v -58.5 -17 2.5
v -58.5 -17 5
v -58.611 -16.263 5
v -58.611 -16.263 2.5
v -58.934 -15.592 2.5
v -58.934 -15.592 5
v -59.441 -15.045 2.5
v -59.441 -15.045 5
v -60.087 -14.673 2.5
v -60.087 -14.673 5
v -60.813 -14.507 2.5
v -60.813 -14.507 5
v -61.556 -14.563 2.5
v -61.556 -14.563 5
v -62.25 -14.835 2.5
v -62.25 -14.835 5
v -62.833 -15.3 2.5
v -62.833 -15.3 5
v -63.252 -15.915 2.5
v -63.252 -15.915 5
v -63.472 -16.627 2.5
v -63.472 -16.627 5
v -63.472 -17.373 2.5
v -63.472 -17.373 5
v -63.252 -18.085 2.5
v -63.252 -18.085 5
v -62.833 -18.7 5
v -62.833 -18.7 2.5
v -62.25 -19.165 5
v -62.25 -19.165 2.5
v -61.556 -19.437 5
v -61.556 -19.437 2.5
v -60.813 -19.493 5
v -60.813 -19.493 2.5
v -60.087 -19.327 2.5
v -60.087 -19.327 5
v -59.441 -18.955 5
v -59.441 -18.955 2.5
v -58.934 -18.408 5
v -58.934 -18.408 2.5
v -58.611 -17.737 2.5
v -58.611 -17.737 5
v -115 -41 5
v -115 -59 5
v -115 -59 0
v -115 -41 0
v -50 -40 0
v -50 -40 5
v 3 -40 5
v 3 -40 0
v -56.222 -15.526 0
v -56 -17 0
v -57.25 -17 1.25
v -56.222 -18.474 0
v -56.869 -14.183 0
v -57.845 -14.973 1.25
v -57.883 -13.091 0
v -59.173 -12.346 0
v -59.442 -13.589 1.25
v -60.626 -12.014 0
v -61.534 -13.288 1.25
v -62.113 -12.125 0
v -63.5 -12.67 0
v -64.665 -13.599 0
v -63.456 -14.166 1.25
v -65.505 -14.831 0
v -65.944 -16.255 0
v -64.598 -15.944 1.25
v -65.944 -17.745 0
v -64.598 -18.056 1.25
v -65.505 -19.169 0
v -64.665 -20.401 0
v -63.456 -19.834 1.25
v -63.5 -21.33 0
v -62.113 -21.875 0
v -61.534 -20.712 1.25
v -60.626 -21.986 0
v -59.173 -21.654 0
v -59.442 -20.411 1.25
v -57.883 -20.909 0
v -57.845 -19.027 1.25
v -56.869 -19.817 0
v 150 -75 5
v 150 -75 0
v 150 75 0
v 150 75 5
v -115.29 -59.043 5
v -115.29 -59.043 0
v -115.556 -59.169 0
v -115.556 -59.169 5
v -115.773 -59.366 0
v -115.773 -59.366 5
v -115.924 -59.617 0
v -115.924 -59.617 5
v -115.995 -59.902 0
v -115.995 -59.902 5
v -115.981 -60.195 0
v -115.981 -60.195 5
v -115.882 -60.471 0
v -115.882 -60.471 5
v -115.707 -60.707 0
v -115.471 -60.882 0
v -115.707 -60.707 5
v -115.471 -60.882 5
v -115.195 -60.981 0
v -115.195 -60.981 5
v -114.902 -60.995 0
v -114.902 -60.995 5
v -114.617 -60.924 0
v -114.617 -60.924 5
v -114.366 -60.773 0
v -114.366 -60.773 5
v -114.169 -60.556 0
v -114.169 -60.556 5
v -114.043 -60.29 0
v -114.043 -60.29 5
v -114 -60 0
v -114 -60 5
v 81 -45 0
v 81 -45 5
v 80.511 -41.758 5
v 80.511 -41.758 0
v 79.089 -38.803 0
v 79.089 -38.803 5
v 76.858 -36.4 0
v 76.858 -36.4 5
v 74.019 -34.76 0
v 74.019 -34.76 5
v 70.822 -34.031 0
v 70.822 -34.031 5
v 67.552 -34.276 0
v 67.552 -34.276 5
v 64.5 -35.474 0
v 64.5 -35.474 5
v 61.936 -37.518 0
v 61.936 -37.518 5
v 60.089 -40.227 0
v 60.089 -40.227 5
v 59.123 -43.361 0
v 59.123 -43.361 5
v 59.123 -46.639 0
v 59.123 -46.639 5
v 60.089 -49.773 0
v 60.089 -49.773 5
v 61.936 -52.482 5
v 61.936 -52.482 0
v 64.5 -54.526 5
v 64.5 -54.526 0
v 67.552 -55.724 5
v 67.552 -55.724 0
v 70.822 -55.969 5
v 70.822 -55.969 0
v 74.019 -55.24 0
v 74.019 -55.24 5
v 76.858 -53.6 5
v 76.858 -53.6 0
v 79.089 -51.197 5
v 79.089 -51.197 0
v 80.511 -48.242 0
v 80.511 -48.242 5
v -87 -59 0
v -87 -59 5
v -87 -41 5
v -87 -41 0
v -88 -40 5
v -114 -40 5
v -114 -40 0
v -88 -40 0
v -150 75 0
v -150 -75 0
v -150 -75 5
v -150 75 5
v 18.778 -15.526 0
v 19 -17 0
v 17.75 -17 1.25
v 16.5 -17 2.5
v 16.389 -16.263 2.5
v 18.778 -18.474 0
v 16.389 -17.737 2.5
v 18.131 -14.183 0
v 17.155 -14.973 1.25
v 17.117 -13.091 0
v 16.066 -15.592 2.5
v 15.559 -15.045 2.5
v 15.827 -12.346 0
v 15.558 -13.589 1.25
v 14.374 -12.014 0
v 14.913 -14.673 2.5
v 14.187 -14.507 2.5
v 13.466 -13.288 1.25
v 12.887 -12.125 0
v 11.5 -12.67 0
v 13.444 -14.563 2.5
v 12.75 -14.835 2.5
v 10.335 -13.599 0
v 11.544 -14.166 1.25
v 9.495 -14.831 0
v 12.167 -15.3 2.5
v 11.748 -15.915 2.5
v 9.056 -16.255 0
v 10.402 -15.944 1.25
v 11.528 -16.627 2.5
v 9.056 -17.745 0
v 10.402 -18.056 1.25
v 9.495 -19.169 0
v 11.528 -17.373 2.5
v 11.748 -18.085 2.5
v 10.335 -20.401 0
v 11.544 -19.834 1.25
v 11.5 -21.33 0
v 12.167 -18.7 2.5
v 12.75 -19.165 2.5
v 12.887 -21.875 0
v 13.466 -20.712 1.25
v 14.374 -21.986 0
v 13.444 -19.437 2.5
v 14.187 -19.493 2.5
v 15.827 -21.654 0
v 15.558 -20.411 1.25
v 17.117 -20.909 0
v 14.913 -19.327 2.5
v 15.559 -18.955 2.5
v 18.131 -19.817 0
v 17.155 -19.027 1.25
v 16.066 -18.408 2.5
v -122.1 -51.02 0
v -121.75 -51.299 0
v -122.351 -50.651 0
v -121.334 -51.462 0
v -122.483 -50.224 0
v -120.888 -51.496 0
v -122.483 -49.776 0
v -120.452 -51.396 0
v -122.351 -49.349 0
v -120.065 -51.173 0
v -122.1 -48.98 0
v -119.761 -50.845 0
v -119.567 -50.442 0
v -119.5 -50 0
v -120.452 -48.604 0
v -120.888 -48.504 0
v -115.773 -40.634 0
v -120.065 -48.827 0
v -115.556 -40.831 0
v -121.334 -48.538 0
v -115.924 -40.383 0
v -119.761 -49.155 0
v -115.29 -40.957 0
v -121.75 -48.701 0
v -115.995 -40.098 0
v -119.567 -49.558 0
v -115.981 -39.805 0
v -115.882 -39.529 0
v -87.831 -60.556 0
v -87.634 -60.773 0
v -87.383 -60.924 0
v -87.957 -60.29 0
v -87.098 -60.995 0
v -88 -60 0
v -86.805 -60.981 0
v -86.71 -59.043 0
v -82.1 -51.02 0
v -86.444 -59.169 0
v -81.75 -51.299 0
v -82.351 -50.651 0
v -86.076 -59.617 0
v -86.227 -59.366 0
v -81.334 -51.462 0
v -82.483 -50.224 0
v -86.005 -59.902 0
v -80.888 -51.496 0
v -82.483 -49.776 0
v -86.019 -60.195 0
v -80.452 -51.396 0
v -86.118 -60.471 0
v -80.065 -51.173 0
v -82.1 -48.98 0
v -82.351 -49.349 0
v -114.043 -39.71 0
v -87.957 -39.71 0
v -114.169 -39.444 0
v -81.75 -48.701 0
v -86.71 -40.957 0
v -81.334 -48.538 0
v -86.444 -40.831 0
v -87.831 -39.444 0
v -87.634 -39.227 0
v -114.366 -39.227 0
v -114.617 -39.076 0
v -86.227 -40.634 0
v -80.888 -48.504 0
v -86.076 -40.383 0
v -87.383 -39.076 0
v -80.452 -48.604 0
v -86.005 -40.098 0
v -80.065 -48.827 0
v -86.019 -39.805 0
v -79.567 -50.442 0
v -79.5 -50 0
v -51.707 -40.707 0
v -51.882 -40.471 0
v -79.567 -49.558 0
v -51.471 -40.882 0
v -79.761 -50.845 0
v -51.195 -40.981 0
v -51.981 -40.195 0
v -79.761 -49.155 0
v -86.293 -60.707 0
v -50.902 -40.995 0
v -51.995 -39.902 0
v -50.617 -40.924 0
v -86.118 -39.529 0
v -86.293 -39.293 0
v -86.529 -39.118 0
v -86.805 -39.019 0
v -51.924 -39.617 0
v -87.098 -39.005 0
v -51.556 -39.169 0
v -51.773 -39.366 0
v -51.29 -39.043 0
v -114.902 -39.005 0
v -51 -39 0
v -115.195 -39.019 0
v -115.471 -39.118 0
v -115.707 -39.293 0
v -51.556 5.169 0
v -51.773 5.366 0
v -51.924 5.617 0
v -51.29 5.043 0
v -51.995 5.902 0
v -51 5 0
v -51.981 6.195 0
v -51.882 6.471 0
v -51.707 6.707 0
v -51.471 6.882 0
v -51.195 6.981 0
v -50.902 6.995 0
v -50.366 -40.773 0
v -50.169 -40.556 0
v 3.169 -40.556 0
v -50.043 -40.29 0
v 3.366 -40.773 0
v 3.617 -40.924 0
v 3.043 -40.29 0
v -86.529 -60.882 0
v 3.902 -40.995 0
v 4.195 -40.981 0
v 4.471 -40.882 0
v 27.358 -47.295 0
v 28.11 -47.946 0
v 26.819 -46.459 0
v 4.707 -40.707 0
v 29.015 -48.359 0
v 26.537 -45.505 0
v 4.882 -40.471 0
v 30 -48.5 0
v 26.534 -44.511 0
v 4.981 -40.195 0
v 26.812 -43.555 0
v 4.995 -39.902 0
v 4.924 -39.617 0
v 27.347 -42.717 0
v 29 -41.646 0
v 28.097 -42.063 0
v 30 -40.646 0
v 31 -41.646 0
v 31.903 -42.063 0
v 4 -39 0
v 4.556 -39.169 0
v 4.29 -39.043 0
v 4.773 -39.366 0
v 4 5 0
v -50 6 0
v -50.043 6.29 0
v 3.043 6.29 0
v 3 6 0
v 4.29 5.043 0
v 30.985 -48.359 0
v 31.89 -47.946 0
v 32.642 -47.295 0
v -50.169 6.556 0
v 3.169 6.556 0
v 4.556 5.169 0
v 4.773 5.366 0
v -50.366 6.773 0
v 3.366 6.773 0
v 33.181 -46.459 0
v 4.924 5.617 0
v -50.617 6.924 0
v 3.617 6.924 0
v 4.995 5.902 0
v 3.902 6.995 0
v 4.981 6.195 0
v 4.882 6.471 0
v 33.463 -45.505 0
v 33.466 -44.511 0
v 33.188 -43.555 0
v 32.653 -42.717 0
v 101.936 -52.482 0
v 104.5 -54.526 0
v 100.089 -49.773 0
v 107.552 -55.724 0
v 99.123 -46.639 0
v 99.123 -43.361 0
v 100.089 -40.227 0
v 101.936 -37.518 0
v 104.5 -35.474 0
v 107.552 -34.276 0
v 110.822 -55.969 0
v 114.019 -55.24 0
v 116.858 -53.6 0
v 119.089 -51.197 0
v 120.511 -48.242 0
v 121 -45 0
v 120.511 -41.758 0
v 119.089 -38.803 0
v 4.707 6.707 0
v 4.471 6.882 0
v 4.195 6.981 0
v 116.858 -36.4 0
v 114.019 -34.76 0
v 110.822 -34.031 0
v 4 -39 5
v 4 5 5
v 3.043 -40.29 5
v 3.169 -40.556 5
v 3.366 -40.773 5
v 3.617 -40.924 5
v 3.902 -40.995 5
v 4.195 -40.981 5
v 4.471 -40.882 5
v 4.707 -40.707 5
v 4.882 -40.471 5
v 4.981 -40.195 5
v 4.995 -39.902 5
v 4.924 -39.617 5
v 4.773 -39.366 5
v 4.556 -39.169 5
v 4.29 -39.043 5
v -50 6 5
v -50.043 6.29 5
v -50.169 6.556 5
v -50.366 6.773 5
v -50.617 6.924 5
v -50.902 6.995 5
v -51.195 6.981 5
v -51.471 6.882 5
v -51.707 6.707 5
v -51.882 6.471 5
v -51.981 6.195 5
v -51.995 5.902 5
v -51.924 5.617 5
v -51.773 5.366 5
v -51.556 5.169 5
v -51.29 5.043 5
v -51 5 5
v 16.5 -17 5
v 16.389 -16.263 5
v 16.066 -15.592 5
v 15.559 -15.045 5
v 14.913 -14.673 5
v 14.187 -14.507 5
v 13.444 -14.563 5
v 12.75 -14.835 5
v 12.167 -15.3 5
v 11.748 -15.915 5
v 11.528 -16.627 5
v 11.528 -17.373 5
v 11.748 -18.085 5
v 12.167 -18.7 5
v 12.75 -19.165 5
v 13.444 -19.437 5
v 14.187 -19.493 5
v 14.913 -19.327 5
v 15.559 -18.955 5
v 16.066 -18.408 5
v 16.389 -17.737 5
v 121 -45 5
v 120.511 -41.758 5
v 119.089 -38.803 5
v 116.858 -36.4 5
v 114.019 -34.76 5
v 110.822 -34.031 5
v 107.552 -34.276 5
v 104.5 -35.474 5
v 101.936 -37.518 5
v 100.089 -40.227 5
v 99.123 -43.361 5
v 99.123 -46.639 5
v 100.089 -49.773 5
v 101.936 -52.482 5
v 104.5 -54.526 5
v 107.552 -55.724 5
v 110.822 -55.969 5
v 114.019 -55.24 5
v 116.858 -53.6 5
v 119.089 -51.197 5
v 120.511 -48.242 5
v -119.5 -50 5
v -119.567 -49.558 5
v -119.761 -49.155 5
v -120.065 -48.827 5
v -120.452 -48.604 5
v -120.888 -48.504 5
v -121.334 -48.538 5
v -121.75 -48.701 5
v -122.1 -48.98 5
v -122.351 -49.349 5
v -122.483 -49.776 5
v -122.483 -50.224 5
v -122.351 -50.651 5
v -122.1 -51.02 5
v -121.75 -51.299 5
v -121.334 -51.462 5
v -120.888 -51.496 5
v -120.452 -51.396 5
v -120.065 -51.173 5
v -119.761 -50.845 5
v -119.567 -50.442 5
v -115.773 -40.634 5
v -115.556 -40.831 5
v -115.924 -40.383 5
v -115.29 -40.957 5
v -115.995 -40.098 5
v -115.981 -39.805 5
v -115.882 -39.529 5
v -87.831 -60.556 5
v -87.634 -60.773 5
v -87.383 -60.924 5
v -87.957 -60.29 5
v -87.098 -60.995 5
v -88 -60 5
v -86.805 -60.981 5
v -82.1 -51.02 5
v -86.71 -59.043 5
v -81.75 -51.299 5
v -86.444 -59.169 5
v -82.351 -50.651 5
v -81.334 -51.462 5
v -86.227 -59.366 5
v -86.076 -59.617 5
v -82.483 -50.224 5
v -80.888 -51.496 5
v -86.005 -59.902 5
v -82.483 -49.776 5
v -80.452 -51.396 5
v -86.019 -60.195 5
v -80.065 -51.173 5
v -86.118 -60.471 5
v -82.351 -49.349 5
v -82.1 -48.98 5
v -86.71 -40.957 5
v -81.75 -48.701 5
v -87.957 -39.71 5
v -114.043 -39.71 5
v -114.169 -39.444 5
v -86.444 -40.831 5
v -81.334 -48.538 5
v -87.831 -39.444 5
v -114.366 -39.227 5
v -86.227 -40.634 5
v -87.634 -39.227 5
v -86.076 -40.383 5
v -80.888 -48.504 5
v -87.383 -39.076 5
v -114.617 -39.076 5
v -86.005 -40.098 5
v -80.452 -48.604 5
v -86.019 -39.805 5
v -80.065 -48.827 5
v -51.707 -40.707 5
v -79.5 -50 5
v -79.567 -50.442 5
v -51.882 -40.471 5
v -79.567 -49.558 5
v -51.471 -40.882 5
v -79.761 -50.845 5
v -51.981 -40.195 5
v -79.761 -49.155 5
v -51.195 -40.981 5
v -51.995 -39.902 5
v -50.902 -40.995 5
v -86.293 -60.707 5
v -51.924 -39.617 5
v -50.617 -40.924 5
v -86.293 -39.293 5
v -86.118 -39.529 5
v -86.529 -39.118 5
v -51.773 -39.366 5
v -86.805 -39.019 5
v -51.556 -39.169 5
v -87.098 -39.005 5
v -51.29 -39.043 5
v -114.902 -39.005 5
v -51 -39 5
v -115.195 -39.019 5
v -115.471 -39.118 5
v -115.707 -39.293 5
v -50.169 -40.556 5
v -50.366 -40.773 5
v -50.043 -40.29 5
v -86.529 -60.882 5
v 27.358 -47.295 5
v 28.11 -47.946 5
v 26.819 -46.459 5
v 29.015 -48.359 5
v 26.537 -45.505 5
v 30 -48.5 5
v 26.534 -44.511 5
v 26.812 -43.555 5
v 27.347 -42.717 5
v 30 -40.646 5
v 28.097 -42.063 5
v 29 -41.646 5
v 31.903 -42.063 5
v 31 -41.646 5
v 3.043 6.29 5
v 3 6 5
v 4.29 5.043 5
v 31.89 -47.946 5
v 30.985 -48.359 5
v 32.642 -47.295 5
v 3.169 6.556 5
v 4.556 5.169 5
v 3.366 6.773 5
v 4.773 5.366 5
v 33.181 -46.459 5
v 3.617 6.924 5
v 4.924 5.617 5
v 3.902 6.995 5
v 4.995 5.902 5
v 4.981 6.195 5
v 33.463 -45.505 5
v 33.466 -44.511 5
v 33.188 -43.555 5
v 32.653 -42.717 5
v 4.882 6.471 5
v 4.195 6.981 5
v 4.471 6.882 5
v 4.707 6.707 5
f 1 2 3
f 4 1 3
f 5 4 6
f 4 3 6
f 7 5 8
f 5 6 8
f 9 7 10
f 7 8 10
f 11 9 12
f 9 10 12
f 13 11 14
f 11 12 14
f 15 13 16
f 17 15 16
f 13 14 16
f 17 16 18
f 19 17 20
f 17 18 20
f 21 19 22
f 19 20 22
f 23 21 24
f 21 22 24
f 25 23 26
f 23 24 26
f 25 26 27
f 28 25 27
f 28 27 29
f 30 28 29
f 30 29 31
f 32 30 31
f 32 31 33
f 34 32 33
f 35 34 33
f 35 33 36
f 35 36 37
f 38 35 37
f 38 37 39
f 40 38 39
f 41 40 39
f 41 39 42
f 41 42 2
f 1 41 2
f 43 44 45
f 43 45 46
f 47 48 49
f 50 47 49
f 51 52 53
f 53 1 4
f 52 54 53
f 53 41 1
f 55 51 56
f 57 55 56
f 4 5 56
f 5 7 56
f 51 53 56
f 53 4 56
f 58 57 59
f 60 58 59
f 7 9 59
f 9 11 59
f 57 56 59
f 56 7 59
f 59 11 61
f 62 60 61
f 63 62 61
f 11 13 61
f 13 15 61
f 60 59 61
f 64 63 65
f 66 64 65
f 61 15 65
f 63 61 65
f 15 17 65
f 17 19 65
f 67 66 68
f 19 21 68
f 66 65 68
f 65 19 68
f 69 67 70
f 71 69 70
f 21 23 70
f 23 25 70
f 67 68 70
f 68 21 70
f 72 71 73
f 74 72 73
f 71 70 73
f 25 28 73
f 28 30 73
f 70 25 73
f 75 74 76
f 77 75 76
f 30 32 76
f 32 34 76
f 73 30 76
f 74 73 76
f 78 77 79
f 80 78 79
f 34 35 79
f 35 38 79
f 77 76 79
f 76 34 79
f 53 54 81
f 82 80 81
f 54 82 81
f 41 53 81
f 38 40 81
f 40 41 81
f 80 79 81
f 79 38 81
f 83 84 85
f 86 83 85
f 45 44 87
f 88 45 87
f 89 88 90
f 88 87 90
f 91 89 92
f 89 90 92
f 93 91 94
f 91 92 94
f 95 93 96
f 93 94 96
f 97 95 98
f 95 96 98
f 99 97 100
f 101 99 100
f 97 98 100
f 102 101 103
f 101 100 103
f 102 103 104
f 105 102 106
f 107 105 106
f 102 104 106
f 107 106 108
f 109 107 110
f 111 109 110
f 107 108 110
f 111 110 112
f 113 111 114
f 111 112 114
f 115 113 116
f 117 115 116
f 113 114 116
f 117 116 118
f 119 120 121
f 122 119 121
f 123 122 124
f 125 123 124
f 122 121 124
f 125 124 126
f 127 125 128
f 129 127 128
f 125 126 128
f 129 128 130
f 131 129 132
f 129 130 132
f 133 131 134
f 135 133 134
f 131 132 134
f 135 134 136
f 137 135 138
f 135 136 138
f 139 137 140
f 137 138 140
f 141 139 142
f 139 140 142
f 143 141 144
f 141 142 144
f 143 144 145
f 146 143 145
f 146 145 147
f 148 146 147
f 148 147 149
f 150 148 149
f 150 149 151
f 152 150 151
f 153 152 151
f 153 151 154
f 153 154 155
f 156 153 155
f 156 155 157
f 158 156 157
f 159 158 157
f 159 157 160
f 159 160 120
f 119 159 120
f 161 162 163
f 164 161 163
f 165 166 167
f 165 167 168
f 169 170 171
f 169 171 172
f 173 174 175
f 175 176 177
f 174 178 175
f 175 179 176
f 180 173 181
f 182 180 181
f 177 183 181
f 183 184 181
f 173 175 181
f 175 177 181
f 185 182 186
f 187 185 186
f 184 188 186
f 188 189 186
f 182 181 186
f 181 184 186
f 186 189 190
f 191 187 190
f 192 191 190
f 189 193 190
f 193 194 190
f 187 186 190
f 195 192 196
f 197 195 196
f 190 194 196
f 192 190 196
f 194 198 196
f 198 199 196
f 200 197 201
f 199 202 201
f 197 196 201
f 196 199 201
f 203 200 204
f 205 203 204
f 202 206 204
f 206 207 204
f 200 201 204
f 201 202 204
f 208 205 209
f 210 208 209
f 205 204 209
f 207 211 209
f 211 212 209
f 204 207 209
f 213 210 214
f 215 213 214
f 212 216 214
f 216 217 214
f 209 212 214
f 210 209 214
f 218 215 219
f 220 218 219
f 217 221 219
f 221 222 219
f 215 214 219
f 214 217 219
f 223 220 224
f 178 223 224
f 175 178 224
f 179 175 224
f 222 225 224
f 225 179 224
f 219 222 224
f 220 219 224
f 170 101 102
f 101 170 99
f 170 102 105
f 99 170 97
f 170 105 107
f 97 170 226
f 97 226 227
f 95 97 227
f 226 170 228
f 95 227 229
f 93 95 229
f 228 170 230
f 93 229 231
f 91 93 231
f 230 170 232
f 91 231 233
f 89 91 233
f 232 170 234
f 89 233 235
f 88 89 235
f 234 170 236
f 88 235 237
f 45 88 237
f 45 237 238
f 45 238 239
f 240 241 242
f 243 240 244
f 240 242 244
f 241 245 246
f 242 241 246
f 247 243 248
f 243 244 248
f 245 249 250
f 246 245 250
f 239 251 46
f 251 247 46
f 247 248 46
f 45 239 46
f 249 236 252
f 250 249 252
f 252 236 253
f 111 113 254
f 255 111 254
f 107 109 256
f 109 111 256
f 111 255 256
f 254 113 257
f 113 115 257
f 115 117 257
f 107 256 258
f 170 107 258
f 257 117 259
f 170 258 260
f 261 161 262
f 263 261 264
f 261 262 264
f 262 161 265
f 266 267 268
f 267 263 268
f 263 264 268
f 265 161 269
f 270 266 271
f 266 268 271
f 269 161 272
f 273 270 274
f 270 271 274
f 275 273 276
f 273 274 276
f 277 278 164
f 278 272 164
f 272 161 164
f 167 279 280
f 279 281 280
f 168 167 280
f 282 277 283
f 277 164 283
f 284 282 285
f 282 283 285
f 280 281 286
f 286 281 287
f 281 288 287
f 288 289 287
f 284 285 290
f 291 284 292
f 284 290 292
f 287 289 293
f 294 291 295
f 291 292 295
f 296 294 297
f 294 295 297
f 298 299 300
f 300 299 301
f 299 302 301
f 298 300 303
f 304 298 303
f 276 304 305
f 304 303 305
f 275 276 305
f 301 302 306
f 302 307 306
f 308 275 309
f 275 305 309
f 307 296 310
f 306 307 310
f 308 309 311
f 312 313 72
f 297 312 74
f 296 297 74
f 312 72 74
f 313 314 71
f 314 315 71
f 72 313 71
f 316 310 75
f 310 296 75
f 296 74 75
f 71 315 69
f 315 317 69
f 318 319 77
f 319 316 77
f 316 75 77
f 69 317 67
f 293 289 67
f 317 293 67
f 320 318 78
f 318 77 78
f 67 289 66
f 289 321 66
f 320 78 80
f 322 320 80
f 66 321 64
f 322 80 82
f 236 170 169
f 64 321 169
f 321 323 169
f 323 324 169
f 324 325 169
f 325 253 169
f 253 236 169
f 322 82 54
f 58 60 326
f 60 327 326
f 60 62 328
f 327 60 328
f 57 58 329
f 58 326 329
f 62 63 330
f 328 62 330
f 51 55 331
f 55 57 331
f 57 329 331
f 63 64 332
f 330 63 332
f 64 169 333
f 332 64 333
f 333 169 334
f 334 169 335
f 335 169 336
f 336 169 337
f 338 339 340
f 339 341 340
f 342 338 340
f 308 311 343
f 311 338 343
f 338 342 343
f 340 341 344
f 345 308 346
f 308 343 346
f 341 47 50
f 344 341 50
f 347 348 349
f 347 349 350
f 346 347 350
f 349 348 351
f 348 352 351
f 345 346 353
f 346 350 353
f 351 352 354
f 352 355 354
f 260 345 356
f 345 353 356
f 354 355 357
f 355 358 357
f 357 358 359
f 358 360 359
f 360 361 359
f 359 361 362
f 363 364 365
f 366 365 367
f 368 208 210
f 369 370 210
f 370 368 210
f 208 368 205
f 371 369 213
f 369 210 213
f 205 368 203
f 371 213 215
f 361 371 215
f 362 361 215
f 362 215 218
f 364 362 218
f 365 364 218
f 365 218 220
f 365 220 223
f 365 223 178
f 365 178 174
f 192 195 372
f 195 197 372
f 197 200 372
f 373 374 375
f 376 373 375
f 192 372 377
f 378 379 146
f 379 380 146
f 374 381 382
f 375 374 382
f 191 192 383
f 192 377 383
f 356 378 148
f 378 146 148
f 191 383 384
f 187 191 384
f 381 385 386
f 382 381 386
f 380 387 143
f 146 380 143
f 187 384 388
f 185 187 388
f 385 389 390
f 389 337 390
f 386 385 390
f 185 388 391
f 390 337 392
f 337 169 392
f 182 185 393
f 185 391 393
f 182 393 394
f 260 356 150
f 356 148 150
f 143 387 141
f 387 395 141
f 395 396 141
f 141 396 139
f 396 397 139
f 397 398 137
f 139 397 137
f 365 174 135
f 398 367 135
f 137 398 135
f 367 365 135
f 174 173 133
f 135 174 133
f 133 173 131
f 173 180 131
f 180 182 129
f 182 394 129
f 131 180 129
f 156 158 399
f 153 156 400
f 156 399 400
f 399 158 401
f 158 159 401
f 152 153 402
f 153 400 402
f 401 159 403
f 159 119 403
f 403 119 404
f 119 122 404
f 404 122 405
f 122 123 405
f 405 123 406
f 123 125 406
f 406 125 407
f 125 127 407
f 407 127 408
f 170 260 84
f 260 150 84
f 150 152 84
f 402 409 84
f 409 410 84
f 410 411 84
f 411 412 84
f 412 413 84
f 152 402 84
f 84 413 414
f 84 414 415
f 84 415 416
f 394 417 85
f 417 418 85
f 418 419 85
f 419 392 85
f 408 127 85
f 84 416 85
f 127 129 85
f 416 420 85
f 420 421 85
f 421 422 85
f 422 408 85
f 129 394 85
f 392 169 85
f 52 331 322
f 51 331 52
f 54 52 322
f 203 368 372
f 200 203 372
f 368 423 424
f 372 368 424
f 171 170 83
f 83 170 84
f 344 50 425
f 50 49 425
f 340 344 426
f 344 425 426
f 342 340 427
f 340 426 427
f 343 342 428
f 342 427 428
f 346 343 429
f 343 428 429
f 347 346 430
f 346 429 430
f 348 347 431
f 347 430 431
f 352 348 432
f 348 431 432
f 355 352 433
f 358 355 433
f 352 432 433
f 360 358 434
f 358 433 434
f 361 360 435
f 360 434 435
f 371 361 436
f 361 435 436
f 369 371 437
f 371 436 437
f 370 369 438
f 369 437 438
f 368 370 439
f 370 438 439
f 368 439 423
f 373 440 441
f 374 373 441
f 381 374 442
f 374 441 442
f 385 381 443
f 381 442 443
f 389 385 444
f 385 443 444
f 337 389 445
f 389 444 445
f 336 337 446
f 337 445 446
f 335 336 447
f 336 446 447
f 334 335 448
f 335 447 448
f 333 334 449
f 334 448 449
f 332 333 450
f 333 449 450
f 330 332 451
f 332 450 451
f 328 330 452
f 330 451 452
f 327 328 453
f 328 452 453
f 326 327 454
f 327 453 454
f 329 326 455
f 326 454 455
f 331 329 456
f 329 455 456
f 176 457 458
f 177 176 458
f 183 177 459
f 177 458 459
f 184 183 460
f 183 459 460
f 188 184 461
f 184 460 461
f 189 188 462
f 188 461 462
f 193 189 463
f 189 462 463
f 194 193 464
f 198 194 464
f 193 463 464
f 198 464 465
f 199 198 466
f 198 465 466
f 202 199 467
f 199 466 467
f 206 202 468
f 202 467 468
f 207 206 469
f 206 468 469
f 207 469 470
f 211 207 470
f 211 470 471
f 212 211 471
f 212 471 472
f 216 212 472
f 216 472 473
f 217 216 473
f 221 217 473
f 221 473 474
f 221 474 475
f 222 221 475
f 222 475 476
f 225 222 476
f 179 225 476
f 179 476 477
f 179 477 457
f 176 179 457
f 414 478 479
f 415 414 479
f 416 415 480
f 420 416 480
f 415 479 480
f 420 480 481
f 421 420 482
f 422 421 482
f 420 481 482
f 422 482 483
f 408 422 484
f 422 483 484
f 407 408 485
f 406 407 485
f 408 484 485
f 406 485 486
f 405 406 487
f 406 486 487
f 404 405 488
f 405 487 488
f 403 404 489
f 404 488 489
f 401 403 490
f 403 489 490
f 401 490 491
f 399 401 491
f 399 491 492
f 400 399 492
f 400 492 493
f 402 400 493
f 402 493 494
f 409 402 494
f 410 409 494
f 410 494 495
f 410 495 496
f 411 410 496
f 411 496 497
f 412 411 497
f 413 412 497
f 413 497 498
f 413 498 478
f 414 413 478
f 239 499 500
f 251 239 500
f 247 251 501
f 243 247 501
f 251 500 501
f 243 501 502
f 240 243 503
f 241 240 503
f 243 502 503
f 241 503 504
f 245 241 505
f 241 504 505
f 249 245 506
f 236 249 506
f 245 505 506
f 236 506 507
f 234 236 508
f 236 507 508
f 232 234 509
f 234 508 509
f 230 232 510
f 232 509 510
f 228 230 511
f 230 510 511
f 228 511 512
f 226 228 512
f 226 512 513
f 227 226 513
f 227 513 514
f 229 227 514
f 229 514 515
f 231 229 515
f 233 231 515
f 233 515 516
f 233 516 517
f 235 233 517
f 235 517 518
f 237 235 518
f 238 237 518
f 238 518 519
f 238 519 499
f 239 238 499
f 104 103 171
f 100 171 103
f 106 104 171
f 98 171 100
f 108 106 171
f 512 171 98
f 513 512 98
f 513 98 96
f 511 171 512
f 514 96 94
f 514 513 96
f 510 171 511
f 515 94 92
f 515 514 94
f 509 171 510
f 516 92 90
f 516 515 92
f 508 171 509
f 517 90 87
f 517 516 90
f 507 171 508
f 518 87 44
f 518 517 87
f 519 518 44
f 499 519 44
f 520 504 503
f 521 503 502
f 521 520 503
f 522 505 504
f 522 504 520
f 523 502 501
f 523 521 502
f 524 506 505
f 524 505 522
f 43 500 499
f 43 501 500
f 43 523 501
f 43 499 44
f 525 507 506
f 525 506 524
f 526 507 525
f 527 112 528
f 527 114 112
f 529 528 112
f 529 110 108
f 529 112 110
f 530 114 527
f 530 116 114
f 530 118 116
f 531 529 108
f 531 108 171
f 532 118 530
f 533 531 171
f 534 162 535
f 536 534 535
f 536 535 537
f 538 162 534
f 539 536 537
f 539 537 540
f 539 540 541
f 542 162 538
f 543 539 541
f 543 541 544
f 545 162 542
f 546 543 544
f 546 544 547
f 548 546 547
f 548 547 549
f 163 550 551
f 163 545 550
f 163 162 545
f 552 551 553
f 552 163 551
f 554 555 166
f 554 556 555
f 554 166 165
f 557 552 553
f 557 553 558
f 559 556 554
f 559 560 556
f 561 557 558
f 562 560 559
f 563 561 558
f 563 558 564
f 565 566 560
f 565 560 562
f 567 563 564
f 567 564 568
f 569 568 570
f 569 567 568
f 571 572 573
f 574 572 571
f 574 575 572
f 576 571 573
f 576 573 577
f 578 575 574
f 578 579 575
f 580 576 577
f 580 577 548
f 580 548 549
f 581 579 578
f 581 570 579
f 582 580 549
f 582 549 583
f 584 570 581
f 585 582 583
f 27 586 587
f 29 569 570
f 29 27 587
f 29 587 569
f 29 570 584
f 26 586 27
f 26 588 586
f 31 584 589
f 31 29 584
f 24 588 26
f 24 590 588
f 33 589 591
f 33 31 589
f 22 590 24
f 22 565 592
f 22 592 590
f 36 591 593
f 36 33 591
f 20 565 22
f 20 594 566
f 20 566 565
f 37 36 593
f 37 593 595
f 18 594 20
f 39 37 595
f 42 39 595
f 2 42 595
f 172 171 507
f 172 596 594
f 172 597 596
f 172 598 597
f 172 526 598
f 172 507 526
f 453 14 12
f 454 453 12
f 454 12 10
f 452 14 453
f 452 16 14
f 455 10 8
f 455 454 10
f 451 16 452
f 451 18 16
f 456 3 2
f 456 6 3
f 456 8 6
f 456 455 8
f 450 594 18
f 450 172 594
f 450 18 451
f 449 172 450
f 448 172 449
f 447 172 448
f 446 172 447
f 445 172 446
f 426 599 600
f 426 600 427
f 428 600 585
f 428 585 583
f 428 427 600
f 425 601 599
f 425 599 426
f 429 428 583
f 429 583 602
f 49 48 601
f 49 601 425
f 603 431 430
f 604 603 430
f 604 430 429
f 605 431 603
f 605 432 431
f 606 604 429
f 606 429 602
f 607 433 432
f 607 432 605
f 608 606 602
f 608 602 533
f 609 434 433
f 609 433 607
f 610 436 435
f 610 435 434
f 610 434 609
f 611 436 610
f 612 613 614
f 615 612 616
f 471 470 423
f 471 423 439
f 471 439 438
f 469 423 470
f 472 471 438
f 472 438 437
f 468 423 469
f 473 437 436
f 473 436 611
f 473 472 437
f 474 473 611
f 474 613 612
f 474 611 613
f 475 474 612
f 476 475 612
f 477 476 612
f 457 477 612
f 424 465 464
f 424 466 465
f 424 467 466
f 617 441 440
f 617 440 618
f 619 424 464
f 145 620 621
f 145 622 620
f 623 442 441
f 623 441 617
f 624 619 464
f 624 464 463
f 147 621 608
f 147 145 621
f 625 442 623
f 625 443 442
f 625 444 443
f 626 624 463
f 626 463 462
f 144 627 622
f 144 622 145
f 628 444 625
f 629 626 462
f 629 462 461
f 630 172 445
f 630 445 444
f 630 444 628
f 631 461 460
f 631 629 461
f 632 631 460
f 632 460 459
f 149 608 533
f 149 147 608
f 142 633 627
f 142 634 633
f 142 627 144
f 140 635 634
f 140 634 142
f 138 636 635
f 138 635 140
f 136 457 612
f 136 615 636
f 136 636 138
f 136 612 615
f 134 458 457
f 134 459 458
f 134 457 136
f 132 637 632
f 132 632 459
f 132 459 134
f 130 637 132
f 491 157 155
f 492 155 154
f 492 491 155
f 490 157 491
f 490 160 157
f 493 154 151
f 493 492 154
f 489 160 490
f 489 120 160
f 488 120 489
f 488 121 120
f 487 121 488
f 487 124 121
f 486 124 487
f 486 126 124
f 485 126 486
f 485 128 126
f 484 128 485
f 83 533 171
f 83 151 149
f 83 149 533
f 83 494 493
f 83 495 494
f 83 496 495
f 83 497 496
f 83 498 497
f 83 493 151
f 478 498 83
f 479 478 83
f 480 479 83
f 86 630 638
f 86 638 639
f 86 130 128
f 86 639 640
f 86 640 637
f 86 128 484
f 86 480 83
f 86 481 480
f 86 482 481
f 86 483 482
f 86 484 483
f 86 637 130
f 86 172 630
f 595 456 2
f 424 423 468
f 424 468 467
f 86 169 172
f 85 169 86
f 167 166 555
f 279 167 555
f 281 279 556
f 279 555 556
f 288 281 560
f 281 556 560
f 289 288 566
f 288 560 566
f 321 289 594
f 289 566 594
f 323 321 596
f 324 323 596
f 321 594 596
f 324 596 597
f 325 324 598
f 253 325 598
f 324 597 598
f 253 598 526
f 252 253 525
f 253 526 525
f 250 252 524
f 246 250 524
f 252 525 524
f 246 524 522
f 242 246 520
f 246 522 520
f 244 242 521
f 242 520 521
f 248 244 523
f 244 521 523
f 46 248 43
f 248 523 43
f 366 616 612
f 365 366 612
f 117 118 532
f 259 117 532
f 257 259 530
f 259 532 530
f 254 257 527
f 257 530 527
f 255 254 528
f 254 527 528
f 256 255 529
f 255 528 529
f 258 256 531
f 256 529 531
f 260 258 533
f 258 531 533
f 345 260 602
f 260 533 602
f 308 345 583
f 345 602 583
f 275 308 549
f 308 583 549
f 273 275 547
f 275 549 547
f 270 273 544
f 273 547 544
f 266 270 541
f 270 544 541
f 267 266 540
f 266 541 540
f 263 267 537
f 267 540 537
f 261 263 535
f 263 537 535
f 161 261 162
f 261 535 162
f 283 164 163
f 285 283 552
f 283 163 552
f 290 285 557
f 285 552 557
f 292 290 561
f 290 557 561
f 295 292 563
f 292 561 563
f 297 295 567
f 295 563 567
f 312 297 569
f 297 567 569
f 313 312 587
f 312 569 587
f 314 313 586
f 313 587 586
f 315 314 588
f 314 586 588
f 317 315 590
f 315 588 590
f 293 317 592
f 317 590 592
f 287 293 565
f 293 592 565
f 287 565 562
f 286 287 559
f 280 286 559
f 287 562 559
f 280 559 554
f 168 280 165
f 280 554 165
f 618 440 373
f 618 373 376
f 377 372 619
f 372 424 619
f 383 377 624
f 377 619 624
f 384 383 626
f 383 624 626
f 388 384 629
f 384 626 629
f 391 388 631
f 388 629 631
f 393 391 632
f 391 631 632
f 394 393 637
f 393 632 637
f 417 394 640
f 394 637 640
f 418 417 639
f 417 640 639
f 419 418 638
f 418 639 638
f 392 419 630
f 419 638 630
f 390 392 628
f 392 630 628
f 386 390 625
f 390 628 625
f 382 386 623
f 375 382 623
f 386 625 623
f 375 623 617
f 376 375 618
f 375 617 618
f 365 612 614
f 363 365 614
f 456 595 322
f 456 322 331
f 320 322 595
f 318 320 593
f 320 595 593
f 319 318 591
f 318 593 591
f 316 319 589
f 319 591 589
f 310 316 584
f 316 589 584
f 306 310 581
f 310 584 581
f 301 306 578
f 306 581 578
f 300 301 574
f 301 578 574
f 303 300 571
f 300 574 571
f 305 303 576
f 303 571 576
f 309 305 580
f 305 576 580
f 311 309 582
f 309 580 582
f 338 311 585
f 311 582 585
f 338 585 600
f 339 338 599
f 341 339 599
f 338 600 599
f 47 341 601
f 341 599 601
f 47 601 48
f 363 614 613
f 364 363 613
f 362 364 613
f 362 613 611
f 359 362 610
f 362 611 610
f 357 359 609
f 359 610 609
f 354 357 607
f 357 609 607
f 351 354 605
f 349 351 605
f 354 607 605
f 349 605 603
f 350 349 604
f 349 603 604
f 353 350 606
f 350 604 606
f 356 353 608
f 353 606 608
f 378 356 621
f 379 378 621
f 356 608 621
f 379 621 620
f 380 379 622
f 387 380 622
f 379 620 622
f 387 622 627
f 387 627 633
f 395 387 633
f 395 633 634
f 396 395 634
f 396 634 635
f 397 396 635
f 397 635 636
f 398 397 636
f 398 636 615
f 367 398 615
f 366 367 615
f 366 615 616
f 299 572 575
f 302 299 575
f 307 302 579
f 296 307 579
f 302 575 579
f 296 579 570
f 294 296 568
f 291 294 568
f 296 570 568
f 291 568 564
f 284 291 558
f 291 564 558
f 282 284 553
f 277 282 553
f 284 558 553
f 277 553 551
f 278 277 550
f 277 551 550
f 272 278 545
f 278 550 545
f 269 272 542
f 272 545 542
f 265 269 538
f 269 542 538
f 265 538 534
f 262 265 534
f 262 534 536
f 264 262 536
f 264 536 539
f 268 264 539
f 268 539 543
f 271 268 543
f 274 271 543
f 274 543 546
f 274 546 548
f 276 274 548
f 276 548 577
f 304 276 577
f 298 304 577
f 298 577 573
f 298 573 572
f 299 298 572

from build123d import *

# Parameters (mm, degrees)
SKIZZE1_W                       = 300
SKIZZE1_H                       = 150
AUFSATZ_LINEAR_AUSTRAGEN1_DEPTH = 5
SKIZZE2_R                       = 1.5
SKIZZE2_W                       = 28
SKIZZE2_H                       = 20
SCHNITT_LINEAR_AUSTRAGEN1_DEPTH = 168.779617356
SKIZZE3_R                       = 11
SCHNITT_LINEAR_AUSTRAGEN2_DEPTH = 168.779617356
SKIZZE4_R                       = 1
SCHNITT_LINEAR_AUSTRAGEN3_DEPTH = 168.779617356
SKIZZE5_R                       = 2.5
SKIZZE5_W                       = 55
SKIZZE5_H                       = 46
SCHNITT_LINEAR_AUSTRAGEN4_DEPTH = 168.779617356
SKIZZE6_R                       = 1
SCHNITT_LINEAR_AUSTRAGEN5_DEPTH = 168.779617356
SCHNITT_LINEAR_AUSTRAGEN6_DEPTH = 168.779617356
FASE1_SIZE                      = 2.5


with BuildPart() as part:
    # Skizze1 → Aufsatz-Linear austragen1 (new body)
    with BuildSketch(Plane.XY):
        Rectangle(SKIZZE1_W, SKIZZE1_H)
    extrude(amount=AUFSATZ_LINEAR_AUSTRAGEN1_DEPTH)

    # Skizze2 → Schnitt-Linear austragen1 (cut, through all)
    with BuildSketch(Plane.XY.offset(5)):
        with Locations((-121, -50)):
            Circle(SKIZZE2_R)
        with Locations((-81, -50)):
            Circle(SKIZZE2_R)
        with Locations((-101, -50)):
            Rectangle(SKIZZE2_W, SKIZZE2_H)
    extrude(amount=-SCHNITT_LINEAR_AUSTRAGEN1_DEPTH, mode=Mode.SUBTRACT)

    # Skizze3 → Schnitt-Linear austragen2 (cut, through all)
    with BuildSketch(Plane.XY.offset(5)):
        with Locations((110, -45)):
            Circle(SKIZZE3_R)
        with Locations((70, -45)):
            Circle(SKIZZE3_R)
    extrude(amount=-SCHNITT_LINEAR_AUSTRAGEN2_DEPTH, mode=Mode.SUBTRACT)

    # Skizze4 → Schnitt-Linear austragen3 (cut, through all)
    with BuildSketch(Plane.XY.offset(5)):
        with Locations((-115, -40)):
            Circle(SKIZZE4_R)
        with Locations((-87, -40)):
            Circle(SKIZZE4_R)
        with Locations((-87, -60)):
            Circle(SKIZZE4_R)
        with Locations((-115, -60)):
            Circle(SKIZZE4_R)
    extrude(amount=-SCHNITT_LINEAR_AUSTRAGEN3_DEPTH, mode=Mode.SUBTRACT)

    # Skizze5 → Schnitt-Linear austragen4 (cut, through all)
    with BuildSketch(Plane.XY.offset(5)):
        with Locations((-61, -17)):
            Circle(SKIZZE5_R)
        with Locations((14, -17)):
            Circle(SKIZZE5_R)
        with Locations((-23.5, -17)):
            Rectangle(SKIZZE5_W, SKIZZE5_H)
    extrude(amount=-SCHNITT_LINEAR_AUSTRAGEN4_DEPTH, mode=Mode.SUBTRACT)

    # Skizze6 → Schnitt-Linear austragen5 (cut, through all)
    with BuildSketch(Plane.XY.offset(5)):
        with Locations((-51, 6)):
            Circle(SKIZZE6_R)
        with Locations((4, 6)):
            Circle(SKIZZE6_R)
        with Locations((4, -40)):
            Circle(SKIZZE6_R)
        with Locations((-51, -40)):
            Circle(SKIZZE6_R)
    extrude(amount=-SCHNITT_LINEAR_AUSTRAGEN5_DEPTH, mode=Mode.SUBTRACT)

    # Skizze7 → Schnitt-Linear austragen6 (cut, through all)
    with BuildSketch(Plane.XY.offset(5)):
        with BuildLine():
            Line((30, -40.645898034), (29, -41.645898034))
            ThreePointArc((29, -41.645898034), (30, -48.5), (31, -41.645898034))
            Line((31, -41.645898034), (30, -40.645898034))
        make_face()
    extrude(amount=-SCHNITT_LINEAR_AUSTRAGEN6_DEPTH, mode=Mode.SUBTRACT)

    # Fase1
    fase1_edges = [part.edges().sort_by_distance(p)[0] for p in [
        (-63.5, -17, 0),
        (11.5, -17, 0),
    ]]
    chamfer(fase1_edges, length=FASE1_SIZE)


solid = part.part
